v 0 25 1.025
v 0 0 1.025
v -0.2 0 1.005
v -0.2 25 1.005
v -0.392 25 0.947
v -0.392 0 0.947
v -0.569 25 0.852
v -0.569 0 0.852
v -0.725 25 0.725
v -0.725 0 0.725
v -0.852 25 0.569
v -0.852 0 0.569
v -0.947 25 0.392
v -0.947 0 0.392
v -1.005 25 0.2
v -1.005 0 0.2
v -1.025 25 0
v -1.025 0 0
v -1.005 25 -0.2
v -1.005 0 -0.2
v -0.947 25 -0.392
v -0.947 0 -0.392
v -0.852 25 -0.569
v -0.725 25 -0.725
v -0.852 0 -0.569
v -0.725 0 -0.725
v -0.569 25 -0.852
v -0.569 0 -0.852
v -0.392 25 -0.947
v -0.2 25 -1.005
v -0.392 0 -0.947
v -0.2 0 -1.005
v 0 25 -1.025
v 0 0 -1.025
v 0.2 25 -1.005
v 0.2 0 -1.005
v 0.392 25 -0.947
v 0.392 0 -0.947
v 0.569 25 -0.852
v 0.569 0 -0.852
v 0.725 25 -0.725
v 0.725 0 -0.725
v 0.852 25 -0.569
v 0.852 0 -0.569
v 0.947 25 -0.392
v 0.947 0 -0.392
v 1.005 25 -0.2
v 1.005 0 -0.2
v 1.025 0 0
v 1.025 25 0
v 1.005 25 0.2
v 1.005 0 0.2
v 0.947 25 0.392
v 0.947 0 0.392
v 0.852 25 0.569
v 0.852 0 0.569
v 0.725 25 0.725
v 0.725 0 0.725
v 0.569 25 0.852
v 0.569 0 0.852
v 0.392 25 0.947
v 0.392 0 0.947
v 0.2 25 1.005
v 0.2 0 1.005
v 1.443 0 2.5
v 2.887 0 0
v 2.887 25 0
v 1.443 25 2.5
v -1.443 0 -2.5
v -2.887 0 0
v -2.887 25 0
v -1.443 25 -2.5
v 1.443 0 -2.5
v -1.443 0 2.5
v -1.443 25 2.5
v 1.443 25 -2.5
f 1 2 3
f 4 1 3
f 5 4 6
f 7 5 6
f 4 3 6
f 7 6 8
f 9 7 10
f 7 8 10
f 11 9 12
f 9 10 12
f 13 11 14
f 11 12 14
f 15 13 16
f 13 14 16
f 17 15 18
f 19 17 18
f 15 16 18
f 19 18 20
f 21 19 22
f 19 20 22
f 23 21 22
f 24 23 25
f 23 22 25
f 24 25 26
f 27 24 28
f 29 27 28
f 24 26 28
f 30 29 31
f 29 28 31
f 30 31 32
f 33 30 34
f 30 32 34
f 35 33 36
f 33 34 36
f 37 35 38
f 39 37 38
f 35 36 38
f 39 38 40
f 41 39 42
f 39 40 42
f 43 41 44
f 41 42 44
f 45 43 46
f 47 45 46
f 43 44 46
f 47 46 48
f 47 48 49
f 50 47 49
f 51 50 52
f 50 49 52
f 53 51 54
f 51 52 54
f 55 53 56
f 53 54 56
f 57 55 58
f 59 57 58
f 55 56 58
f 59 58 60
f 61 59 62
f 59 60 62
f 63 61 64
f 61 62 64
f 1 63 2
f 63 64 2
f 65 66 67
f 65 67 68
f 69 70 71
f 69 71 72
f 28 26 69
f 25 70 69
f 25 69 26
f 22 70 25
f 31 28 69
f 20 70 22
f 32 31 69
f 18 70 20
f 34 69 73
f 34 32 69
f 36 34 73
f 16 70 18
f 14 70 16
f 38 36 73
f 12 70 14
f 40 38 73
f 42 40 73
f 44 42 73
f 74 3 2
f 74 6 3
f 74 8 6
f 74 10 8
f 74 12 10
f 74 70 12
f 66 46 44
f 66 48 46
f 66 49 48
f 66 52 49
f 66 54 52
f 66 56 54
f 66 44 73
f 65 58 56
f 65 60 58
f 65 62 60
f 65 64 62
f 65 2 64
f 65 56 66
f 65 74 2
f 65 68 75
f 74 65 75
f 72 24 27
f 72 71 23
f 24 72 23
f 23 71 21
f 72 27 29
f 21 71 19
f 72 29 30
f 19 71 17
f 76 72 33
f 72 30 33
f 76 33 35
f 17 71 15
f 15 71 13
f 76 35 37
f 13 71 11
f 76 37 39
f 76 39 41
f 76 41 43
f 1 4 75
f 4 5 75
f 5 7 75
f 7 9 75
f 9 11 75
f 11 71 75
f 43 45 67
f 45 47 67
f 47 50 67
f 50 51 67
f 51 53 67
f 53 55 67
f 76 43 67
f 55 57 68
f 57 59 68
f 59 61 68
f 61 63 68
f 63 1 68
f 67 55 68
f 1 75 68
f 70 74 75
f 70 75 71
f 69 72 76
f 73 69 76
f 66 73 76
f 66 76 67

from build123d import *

# Parameters (mm, degrees)
SKETCH_1_R      = 1.025
EXTRUDE_1_DEPTH = 25


with BuildPart() as part:
    # 草图1 → 凸台-拉伸1 (new body)
    with BuildSketch(Plane.XZ):
        Polygon((-1.443375673, -2.5), (1.443375673, -2.5), (2.886751346, 0), (1.443375673, 2.5), (-1.443375673, 2.5), (-2.886751346, 0), align=None)
        with Locations(Location((0, 0, 0), (0, 0, 90))):
            Circle(SKETCH_1_R, mode=Mode.SUBTRACT)
    extrude(amount=-EXTRUDE_1_DEPTH)


solid = part.part
